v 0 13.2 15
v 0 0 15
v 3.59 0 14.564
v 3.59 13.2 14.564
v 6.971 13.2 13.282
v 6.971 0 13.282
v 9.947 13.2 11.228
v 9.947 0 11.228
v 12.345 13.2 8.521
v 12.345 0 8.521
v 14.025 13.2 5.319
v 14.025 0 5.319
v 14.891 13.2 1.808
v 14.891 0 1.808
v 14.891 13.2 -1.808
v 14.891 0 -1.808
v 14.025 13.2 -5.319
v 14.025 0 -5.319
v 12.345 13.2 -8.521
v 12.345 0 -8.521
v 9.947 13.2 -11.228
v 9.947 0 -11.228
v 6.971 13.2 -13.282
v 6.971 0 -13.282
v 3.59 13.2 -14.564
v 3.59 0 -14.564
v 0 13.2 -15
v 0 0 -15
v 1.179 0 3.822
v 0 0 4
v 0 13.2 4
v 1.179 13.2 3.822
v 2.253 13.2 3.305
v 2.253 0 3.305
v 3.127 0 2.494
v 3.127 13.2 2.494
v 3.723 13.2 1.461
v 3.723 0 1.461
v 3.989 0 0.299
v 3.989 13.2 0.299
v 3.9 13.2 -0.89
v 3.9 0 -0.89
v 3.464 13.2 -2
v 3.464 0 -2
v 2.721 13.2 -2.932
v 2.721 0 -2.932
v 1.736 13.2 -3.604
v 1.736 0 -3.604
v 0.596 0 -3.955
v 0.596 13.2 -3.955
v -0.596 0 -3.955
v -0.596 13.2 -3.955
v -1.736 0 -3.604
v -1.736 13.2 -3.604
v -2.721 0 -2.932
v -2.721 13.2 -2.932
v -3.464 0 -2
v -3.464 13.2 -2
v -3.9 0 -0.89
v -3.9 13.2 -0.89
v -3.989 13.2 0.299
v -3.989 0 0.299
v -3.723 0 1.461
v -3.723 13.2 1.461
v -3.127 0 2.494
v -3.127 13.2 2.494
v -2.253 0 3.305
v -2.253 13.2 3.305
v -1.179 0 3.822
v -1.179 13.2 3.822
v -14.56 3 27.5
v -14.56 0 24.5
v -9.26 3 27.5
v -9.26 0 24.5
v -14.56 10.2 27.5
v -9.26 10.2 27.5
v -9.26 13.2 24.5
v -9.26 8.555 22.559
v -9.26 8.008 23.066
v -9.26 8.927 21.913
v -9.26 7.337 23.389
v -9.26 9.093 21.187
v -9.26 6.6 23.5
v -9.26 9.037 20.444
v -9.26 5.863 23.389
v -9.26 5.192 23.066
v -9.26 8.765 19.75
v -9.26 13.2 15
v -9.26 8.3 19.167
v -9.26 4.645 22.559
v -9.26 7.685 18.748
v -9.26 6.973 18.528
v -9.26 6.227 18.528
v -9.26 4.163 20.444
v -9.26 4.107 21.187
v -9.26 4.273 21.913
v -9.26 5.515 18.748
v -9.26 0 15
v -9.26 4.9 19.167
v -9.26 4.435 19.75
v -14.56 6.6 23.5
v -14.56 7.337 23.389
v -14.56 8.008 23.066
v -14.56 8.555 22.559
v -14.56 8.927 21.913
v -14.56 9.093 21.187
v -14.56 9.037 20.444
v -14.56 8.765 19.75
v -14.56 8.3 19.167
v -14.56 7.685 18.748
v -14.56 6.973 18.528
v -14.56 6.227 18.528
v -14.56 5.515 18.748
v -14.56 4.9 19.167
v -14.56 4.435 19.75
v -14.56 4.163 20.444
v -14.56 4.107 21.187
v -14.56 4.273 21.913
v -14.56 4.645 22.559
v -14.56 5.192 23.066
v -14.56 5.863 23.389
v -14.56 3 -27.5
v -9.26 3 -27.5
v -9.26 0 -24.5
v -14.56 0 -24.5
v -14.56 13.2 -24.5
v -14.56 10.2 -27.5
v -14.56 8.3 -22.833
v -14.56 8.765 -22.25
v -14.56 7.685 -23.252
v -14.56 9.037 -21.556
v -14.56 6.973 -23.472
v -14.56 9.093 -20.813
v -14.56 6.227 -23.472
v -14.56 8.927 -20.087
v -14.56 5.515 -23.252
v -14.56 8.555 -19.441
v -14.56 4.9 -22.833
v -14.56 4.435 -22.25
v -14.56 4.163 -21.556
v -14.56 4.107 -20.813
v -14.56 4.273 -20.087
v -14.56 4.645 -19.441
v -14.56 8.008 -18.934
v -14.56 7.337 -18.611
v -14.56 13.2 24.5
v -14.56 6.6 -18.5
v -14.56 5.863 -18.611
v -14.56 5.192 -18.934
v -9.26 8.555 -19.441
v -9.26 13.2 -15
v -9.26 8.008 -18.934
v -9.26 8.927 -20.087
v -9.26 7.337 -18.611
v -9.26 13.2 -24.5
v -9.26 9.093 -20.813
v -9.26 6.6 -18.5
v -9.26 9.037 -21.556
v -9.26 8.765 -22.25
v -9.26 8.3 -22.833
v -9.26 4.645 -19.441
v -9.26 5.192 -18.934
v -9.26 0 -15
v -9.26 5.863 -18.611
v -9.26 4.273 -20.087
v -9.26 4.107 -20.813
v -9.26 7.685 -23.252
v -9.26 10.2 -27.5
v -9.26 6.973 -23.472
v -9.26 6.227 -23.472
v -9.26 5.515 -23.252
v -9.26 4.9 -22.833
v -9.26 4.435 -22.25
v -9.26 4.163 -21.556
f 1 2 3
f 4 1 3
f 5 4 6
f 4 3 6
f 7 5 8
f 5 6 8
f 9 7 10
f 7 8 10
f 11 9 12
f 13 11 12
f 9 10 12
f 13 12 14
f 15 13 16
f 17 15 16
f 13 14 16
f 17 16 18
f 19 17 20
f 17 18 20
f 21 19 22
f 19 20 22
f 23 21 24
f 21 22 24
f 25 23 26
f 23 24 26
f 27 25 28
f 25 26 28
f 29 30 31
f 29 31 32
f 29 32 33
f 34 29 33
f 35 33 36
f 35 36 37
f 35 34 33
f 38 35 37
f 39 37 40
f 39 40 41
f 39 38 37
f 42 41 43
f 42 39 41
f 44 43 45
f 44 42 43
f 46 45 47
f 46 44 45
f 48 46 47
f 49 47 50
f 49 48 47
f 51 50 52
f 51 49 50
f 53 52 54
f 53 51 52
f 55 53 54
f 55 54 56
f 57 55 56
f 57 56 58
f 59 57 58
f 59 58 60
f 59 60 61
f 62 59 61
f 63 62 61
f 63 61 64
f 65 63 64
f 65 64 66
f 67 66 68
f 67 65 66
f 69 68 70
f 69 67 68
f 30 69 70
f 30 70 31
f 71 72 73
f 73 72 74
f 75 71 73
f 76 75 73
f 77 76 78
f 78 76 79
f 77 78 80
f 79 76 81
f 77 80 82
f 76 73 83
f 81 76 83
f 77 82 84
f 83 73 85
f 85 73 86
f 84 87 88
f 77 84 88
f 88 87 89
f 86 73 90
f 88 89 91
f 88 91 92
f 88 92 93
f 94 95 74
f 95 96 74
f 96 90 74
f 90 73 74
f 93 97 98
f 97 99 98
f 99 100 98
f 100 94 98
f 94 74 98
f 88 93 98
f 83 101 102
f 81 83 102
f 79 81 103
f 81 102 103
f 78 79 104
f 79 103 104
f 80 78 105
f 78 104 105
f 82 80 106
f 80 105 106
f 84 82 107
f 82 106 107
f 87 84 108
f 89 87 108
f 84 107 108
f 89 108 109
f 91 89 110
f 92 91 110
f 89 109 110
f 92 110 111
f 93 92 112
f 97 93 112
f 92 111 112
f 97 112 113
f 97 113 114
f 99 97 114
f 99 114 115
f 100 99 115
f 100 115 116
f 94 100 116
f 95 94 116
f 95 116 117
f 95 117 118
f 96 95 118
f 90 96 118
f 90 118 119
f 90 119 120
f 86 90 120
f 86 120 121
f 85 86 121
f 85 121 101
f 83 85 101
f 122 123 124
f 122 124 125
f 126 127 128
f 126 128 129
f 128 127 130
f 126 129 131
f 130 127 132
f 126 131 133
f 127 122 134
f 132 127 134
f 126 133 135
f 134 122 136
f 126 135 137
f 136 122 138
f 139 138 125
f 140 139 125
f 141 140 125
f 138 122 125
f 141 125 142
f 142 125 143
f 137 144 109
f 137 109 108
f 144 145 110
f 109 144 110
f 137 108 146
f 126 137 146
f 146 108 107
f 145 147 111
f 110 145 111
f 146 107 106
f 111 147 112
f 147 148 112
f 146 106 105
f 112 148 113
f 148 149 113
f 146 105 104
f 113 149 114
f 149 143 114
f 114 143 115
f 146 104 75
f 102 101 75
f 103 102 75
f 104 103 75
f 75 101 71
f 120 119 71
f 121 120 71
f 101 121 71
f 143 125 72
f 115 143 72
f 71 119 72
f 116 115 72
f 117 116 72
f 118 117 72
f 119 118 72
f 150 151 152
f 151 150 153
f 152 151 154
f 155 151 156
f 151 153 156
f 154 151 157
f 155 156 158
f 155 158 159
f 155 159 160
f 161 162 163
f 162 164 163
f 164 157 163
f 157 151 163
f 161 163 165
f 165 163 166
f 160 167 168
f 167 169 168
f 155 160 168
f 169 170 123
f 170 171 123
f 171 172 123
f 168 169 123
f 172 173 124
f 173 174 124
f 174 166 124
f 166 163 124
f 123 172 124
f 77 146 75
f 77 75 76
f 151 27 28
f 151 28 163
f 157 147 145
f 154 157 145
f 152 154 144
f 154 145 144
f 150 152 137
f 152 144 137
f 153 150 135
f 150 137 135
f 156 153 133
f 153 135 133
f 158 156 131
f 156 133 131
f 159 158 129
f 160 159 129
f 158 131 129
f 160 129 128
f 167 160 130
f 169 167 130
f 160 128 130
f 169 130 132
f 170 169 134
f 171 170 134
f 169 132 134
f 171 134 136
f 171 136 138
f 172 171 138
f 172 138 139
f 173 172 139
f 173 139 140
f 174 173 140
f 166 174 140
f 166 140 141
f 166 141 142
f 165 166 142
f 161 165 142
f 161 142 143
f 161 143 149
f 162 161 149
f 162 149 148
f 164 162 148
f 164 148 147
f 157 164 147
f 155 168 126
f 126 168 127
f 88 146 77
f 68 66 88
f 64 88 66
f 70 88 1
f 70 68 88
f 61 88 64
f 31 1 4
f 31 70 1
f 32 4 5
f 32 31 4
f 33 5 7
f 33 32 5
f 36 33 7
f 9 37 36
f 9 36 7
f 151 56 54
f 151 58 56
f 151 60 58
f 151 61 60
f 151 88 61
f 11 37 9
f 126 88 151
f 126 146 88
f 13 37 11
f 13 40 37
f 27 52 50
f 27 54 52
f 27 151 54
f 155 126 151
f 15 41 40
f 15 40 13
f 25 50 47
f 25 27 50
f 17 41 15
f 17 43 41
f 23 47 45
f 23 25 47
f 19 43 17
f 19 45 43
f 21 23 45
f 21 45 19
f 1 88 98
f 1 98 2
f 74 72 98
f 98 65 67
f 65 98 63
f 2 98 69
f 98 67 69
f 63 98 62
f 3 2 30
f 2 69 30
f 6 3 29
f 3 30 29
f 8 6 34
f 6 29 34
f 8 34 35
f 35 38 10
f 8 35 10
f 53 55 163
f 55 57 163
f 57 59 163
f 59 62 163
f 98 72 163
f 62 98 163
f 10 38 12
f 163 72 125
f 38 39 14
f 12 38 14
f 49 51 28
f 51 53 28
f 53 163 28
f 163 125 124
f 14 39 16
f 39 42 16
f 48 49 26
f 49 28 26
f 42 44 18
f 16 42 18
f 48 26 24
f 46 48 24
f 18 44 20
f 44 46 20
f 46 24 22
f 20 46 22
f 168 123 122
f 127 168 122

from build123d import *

# Parameters (mm, degrees)
SKETCH2_R                = 4
BOSS_EXTRUDE2_DEPTH      = 13.2
F_5_0_5_DIAMETER_HOLE1_D = 5
CHAMFER1_SIZE            = 3


with BuildPart() as part:
    # Sketch2 → Boss-Extrude2 (new body)
    with BuildSketch(Plane(origin=(0, 0, 0), x_dir=(1, 0, 0), z_dir=(0, 1, 0))):
        with BuildLine():
            Line((-14.56, -27.5), (-9.26, -27.5))
            Line((-9.26, -27.5), (-9.26, -15))
            Line((-9.26, -15), (0, -15))
            ThreePointArc((0, -15), (15, 0), (0, 15))
            Line((0, 15), (-9.26, 15))
            Line((-9.26, 15), (-9.26, 27.5))
            Line((-9.26, 27.5), (-14.56, 27.5))
            Line((-14.56, 27.5), (-14.56, -27.5))
        make_face()
        with Locations(Location((0, 0, 0), (0, 0, 270))):
            Circle(SKETCH2_R, mode=Mode.SUBTRACT)
    extrude(amount=BOSS_EXTRUDE2_DEPTH)

    # Ø5.0 (5) Diameter Hole1 (through all)
    with Locations(Plane(origin=(-9.26, 0, 0), x_dir=(0, 0, -1), z_dir=(1, 0, 0))):
        with Locations((21, 6.6), (-21, 6.6)):
            Hole(F_5_0_5_DIAMETER_HOLE1_D / 2)

    # Chamfer1
    chamfer1_edges = [part.edges().sort_by_distance(p)[0] for p in [
        (-11.91, 0, -27.5),
        (-11.91, 13.2, -27.5),
        (-11.91, 13.2, 27.5),
        (-11.91, 0, 27.5),
    ]]
    chamfer(chamfer1_edges, length=CHAMFER1_SIZE)


solid = part.part
